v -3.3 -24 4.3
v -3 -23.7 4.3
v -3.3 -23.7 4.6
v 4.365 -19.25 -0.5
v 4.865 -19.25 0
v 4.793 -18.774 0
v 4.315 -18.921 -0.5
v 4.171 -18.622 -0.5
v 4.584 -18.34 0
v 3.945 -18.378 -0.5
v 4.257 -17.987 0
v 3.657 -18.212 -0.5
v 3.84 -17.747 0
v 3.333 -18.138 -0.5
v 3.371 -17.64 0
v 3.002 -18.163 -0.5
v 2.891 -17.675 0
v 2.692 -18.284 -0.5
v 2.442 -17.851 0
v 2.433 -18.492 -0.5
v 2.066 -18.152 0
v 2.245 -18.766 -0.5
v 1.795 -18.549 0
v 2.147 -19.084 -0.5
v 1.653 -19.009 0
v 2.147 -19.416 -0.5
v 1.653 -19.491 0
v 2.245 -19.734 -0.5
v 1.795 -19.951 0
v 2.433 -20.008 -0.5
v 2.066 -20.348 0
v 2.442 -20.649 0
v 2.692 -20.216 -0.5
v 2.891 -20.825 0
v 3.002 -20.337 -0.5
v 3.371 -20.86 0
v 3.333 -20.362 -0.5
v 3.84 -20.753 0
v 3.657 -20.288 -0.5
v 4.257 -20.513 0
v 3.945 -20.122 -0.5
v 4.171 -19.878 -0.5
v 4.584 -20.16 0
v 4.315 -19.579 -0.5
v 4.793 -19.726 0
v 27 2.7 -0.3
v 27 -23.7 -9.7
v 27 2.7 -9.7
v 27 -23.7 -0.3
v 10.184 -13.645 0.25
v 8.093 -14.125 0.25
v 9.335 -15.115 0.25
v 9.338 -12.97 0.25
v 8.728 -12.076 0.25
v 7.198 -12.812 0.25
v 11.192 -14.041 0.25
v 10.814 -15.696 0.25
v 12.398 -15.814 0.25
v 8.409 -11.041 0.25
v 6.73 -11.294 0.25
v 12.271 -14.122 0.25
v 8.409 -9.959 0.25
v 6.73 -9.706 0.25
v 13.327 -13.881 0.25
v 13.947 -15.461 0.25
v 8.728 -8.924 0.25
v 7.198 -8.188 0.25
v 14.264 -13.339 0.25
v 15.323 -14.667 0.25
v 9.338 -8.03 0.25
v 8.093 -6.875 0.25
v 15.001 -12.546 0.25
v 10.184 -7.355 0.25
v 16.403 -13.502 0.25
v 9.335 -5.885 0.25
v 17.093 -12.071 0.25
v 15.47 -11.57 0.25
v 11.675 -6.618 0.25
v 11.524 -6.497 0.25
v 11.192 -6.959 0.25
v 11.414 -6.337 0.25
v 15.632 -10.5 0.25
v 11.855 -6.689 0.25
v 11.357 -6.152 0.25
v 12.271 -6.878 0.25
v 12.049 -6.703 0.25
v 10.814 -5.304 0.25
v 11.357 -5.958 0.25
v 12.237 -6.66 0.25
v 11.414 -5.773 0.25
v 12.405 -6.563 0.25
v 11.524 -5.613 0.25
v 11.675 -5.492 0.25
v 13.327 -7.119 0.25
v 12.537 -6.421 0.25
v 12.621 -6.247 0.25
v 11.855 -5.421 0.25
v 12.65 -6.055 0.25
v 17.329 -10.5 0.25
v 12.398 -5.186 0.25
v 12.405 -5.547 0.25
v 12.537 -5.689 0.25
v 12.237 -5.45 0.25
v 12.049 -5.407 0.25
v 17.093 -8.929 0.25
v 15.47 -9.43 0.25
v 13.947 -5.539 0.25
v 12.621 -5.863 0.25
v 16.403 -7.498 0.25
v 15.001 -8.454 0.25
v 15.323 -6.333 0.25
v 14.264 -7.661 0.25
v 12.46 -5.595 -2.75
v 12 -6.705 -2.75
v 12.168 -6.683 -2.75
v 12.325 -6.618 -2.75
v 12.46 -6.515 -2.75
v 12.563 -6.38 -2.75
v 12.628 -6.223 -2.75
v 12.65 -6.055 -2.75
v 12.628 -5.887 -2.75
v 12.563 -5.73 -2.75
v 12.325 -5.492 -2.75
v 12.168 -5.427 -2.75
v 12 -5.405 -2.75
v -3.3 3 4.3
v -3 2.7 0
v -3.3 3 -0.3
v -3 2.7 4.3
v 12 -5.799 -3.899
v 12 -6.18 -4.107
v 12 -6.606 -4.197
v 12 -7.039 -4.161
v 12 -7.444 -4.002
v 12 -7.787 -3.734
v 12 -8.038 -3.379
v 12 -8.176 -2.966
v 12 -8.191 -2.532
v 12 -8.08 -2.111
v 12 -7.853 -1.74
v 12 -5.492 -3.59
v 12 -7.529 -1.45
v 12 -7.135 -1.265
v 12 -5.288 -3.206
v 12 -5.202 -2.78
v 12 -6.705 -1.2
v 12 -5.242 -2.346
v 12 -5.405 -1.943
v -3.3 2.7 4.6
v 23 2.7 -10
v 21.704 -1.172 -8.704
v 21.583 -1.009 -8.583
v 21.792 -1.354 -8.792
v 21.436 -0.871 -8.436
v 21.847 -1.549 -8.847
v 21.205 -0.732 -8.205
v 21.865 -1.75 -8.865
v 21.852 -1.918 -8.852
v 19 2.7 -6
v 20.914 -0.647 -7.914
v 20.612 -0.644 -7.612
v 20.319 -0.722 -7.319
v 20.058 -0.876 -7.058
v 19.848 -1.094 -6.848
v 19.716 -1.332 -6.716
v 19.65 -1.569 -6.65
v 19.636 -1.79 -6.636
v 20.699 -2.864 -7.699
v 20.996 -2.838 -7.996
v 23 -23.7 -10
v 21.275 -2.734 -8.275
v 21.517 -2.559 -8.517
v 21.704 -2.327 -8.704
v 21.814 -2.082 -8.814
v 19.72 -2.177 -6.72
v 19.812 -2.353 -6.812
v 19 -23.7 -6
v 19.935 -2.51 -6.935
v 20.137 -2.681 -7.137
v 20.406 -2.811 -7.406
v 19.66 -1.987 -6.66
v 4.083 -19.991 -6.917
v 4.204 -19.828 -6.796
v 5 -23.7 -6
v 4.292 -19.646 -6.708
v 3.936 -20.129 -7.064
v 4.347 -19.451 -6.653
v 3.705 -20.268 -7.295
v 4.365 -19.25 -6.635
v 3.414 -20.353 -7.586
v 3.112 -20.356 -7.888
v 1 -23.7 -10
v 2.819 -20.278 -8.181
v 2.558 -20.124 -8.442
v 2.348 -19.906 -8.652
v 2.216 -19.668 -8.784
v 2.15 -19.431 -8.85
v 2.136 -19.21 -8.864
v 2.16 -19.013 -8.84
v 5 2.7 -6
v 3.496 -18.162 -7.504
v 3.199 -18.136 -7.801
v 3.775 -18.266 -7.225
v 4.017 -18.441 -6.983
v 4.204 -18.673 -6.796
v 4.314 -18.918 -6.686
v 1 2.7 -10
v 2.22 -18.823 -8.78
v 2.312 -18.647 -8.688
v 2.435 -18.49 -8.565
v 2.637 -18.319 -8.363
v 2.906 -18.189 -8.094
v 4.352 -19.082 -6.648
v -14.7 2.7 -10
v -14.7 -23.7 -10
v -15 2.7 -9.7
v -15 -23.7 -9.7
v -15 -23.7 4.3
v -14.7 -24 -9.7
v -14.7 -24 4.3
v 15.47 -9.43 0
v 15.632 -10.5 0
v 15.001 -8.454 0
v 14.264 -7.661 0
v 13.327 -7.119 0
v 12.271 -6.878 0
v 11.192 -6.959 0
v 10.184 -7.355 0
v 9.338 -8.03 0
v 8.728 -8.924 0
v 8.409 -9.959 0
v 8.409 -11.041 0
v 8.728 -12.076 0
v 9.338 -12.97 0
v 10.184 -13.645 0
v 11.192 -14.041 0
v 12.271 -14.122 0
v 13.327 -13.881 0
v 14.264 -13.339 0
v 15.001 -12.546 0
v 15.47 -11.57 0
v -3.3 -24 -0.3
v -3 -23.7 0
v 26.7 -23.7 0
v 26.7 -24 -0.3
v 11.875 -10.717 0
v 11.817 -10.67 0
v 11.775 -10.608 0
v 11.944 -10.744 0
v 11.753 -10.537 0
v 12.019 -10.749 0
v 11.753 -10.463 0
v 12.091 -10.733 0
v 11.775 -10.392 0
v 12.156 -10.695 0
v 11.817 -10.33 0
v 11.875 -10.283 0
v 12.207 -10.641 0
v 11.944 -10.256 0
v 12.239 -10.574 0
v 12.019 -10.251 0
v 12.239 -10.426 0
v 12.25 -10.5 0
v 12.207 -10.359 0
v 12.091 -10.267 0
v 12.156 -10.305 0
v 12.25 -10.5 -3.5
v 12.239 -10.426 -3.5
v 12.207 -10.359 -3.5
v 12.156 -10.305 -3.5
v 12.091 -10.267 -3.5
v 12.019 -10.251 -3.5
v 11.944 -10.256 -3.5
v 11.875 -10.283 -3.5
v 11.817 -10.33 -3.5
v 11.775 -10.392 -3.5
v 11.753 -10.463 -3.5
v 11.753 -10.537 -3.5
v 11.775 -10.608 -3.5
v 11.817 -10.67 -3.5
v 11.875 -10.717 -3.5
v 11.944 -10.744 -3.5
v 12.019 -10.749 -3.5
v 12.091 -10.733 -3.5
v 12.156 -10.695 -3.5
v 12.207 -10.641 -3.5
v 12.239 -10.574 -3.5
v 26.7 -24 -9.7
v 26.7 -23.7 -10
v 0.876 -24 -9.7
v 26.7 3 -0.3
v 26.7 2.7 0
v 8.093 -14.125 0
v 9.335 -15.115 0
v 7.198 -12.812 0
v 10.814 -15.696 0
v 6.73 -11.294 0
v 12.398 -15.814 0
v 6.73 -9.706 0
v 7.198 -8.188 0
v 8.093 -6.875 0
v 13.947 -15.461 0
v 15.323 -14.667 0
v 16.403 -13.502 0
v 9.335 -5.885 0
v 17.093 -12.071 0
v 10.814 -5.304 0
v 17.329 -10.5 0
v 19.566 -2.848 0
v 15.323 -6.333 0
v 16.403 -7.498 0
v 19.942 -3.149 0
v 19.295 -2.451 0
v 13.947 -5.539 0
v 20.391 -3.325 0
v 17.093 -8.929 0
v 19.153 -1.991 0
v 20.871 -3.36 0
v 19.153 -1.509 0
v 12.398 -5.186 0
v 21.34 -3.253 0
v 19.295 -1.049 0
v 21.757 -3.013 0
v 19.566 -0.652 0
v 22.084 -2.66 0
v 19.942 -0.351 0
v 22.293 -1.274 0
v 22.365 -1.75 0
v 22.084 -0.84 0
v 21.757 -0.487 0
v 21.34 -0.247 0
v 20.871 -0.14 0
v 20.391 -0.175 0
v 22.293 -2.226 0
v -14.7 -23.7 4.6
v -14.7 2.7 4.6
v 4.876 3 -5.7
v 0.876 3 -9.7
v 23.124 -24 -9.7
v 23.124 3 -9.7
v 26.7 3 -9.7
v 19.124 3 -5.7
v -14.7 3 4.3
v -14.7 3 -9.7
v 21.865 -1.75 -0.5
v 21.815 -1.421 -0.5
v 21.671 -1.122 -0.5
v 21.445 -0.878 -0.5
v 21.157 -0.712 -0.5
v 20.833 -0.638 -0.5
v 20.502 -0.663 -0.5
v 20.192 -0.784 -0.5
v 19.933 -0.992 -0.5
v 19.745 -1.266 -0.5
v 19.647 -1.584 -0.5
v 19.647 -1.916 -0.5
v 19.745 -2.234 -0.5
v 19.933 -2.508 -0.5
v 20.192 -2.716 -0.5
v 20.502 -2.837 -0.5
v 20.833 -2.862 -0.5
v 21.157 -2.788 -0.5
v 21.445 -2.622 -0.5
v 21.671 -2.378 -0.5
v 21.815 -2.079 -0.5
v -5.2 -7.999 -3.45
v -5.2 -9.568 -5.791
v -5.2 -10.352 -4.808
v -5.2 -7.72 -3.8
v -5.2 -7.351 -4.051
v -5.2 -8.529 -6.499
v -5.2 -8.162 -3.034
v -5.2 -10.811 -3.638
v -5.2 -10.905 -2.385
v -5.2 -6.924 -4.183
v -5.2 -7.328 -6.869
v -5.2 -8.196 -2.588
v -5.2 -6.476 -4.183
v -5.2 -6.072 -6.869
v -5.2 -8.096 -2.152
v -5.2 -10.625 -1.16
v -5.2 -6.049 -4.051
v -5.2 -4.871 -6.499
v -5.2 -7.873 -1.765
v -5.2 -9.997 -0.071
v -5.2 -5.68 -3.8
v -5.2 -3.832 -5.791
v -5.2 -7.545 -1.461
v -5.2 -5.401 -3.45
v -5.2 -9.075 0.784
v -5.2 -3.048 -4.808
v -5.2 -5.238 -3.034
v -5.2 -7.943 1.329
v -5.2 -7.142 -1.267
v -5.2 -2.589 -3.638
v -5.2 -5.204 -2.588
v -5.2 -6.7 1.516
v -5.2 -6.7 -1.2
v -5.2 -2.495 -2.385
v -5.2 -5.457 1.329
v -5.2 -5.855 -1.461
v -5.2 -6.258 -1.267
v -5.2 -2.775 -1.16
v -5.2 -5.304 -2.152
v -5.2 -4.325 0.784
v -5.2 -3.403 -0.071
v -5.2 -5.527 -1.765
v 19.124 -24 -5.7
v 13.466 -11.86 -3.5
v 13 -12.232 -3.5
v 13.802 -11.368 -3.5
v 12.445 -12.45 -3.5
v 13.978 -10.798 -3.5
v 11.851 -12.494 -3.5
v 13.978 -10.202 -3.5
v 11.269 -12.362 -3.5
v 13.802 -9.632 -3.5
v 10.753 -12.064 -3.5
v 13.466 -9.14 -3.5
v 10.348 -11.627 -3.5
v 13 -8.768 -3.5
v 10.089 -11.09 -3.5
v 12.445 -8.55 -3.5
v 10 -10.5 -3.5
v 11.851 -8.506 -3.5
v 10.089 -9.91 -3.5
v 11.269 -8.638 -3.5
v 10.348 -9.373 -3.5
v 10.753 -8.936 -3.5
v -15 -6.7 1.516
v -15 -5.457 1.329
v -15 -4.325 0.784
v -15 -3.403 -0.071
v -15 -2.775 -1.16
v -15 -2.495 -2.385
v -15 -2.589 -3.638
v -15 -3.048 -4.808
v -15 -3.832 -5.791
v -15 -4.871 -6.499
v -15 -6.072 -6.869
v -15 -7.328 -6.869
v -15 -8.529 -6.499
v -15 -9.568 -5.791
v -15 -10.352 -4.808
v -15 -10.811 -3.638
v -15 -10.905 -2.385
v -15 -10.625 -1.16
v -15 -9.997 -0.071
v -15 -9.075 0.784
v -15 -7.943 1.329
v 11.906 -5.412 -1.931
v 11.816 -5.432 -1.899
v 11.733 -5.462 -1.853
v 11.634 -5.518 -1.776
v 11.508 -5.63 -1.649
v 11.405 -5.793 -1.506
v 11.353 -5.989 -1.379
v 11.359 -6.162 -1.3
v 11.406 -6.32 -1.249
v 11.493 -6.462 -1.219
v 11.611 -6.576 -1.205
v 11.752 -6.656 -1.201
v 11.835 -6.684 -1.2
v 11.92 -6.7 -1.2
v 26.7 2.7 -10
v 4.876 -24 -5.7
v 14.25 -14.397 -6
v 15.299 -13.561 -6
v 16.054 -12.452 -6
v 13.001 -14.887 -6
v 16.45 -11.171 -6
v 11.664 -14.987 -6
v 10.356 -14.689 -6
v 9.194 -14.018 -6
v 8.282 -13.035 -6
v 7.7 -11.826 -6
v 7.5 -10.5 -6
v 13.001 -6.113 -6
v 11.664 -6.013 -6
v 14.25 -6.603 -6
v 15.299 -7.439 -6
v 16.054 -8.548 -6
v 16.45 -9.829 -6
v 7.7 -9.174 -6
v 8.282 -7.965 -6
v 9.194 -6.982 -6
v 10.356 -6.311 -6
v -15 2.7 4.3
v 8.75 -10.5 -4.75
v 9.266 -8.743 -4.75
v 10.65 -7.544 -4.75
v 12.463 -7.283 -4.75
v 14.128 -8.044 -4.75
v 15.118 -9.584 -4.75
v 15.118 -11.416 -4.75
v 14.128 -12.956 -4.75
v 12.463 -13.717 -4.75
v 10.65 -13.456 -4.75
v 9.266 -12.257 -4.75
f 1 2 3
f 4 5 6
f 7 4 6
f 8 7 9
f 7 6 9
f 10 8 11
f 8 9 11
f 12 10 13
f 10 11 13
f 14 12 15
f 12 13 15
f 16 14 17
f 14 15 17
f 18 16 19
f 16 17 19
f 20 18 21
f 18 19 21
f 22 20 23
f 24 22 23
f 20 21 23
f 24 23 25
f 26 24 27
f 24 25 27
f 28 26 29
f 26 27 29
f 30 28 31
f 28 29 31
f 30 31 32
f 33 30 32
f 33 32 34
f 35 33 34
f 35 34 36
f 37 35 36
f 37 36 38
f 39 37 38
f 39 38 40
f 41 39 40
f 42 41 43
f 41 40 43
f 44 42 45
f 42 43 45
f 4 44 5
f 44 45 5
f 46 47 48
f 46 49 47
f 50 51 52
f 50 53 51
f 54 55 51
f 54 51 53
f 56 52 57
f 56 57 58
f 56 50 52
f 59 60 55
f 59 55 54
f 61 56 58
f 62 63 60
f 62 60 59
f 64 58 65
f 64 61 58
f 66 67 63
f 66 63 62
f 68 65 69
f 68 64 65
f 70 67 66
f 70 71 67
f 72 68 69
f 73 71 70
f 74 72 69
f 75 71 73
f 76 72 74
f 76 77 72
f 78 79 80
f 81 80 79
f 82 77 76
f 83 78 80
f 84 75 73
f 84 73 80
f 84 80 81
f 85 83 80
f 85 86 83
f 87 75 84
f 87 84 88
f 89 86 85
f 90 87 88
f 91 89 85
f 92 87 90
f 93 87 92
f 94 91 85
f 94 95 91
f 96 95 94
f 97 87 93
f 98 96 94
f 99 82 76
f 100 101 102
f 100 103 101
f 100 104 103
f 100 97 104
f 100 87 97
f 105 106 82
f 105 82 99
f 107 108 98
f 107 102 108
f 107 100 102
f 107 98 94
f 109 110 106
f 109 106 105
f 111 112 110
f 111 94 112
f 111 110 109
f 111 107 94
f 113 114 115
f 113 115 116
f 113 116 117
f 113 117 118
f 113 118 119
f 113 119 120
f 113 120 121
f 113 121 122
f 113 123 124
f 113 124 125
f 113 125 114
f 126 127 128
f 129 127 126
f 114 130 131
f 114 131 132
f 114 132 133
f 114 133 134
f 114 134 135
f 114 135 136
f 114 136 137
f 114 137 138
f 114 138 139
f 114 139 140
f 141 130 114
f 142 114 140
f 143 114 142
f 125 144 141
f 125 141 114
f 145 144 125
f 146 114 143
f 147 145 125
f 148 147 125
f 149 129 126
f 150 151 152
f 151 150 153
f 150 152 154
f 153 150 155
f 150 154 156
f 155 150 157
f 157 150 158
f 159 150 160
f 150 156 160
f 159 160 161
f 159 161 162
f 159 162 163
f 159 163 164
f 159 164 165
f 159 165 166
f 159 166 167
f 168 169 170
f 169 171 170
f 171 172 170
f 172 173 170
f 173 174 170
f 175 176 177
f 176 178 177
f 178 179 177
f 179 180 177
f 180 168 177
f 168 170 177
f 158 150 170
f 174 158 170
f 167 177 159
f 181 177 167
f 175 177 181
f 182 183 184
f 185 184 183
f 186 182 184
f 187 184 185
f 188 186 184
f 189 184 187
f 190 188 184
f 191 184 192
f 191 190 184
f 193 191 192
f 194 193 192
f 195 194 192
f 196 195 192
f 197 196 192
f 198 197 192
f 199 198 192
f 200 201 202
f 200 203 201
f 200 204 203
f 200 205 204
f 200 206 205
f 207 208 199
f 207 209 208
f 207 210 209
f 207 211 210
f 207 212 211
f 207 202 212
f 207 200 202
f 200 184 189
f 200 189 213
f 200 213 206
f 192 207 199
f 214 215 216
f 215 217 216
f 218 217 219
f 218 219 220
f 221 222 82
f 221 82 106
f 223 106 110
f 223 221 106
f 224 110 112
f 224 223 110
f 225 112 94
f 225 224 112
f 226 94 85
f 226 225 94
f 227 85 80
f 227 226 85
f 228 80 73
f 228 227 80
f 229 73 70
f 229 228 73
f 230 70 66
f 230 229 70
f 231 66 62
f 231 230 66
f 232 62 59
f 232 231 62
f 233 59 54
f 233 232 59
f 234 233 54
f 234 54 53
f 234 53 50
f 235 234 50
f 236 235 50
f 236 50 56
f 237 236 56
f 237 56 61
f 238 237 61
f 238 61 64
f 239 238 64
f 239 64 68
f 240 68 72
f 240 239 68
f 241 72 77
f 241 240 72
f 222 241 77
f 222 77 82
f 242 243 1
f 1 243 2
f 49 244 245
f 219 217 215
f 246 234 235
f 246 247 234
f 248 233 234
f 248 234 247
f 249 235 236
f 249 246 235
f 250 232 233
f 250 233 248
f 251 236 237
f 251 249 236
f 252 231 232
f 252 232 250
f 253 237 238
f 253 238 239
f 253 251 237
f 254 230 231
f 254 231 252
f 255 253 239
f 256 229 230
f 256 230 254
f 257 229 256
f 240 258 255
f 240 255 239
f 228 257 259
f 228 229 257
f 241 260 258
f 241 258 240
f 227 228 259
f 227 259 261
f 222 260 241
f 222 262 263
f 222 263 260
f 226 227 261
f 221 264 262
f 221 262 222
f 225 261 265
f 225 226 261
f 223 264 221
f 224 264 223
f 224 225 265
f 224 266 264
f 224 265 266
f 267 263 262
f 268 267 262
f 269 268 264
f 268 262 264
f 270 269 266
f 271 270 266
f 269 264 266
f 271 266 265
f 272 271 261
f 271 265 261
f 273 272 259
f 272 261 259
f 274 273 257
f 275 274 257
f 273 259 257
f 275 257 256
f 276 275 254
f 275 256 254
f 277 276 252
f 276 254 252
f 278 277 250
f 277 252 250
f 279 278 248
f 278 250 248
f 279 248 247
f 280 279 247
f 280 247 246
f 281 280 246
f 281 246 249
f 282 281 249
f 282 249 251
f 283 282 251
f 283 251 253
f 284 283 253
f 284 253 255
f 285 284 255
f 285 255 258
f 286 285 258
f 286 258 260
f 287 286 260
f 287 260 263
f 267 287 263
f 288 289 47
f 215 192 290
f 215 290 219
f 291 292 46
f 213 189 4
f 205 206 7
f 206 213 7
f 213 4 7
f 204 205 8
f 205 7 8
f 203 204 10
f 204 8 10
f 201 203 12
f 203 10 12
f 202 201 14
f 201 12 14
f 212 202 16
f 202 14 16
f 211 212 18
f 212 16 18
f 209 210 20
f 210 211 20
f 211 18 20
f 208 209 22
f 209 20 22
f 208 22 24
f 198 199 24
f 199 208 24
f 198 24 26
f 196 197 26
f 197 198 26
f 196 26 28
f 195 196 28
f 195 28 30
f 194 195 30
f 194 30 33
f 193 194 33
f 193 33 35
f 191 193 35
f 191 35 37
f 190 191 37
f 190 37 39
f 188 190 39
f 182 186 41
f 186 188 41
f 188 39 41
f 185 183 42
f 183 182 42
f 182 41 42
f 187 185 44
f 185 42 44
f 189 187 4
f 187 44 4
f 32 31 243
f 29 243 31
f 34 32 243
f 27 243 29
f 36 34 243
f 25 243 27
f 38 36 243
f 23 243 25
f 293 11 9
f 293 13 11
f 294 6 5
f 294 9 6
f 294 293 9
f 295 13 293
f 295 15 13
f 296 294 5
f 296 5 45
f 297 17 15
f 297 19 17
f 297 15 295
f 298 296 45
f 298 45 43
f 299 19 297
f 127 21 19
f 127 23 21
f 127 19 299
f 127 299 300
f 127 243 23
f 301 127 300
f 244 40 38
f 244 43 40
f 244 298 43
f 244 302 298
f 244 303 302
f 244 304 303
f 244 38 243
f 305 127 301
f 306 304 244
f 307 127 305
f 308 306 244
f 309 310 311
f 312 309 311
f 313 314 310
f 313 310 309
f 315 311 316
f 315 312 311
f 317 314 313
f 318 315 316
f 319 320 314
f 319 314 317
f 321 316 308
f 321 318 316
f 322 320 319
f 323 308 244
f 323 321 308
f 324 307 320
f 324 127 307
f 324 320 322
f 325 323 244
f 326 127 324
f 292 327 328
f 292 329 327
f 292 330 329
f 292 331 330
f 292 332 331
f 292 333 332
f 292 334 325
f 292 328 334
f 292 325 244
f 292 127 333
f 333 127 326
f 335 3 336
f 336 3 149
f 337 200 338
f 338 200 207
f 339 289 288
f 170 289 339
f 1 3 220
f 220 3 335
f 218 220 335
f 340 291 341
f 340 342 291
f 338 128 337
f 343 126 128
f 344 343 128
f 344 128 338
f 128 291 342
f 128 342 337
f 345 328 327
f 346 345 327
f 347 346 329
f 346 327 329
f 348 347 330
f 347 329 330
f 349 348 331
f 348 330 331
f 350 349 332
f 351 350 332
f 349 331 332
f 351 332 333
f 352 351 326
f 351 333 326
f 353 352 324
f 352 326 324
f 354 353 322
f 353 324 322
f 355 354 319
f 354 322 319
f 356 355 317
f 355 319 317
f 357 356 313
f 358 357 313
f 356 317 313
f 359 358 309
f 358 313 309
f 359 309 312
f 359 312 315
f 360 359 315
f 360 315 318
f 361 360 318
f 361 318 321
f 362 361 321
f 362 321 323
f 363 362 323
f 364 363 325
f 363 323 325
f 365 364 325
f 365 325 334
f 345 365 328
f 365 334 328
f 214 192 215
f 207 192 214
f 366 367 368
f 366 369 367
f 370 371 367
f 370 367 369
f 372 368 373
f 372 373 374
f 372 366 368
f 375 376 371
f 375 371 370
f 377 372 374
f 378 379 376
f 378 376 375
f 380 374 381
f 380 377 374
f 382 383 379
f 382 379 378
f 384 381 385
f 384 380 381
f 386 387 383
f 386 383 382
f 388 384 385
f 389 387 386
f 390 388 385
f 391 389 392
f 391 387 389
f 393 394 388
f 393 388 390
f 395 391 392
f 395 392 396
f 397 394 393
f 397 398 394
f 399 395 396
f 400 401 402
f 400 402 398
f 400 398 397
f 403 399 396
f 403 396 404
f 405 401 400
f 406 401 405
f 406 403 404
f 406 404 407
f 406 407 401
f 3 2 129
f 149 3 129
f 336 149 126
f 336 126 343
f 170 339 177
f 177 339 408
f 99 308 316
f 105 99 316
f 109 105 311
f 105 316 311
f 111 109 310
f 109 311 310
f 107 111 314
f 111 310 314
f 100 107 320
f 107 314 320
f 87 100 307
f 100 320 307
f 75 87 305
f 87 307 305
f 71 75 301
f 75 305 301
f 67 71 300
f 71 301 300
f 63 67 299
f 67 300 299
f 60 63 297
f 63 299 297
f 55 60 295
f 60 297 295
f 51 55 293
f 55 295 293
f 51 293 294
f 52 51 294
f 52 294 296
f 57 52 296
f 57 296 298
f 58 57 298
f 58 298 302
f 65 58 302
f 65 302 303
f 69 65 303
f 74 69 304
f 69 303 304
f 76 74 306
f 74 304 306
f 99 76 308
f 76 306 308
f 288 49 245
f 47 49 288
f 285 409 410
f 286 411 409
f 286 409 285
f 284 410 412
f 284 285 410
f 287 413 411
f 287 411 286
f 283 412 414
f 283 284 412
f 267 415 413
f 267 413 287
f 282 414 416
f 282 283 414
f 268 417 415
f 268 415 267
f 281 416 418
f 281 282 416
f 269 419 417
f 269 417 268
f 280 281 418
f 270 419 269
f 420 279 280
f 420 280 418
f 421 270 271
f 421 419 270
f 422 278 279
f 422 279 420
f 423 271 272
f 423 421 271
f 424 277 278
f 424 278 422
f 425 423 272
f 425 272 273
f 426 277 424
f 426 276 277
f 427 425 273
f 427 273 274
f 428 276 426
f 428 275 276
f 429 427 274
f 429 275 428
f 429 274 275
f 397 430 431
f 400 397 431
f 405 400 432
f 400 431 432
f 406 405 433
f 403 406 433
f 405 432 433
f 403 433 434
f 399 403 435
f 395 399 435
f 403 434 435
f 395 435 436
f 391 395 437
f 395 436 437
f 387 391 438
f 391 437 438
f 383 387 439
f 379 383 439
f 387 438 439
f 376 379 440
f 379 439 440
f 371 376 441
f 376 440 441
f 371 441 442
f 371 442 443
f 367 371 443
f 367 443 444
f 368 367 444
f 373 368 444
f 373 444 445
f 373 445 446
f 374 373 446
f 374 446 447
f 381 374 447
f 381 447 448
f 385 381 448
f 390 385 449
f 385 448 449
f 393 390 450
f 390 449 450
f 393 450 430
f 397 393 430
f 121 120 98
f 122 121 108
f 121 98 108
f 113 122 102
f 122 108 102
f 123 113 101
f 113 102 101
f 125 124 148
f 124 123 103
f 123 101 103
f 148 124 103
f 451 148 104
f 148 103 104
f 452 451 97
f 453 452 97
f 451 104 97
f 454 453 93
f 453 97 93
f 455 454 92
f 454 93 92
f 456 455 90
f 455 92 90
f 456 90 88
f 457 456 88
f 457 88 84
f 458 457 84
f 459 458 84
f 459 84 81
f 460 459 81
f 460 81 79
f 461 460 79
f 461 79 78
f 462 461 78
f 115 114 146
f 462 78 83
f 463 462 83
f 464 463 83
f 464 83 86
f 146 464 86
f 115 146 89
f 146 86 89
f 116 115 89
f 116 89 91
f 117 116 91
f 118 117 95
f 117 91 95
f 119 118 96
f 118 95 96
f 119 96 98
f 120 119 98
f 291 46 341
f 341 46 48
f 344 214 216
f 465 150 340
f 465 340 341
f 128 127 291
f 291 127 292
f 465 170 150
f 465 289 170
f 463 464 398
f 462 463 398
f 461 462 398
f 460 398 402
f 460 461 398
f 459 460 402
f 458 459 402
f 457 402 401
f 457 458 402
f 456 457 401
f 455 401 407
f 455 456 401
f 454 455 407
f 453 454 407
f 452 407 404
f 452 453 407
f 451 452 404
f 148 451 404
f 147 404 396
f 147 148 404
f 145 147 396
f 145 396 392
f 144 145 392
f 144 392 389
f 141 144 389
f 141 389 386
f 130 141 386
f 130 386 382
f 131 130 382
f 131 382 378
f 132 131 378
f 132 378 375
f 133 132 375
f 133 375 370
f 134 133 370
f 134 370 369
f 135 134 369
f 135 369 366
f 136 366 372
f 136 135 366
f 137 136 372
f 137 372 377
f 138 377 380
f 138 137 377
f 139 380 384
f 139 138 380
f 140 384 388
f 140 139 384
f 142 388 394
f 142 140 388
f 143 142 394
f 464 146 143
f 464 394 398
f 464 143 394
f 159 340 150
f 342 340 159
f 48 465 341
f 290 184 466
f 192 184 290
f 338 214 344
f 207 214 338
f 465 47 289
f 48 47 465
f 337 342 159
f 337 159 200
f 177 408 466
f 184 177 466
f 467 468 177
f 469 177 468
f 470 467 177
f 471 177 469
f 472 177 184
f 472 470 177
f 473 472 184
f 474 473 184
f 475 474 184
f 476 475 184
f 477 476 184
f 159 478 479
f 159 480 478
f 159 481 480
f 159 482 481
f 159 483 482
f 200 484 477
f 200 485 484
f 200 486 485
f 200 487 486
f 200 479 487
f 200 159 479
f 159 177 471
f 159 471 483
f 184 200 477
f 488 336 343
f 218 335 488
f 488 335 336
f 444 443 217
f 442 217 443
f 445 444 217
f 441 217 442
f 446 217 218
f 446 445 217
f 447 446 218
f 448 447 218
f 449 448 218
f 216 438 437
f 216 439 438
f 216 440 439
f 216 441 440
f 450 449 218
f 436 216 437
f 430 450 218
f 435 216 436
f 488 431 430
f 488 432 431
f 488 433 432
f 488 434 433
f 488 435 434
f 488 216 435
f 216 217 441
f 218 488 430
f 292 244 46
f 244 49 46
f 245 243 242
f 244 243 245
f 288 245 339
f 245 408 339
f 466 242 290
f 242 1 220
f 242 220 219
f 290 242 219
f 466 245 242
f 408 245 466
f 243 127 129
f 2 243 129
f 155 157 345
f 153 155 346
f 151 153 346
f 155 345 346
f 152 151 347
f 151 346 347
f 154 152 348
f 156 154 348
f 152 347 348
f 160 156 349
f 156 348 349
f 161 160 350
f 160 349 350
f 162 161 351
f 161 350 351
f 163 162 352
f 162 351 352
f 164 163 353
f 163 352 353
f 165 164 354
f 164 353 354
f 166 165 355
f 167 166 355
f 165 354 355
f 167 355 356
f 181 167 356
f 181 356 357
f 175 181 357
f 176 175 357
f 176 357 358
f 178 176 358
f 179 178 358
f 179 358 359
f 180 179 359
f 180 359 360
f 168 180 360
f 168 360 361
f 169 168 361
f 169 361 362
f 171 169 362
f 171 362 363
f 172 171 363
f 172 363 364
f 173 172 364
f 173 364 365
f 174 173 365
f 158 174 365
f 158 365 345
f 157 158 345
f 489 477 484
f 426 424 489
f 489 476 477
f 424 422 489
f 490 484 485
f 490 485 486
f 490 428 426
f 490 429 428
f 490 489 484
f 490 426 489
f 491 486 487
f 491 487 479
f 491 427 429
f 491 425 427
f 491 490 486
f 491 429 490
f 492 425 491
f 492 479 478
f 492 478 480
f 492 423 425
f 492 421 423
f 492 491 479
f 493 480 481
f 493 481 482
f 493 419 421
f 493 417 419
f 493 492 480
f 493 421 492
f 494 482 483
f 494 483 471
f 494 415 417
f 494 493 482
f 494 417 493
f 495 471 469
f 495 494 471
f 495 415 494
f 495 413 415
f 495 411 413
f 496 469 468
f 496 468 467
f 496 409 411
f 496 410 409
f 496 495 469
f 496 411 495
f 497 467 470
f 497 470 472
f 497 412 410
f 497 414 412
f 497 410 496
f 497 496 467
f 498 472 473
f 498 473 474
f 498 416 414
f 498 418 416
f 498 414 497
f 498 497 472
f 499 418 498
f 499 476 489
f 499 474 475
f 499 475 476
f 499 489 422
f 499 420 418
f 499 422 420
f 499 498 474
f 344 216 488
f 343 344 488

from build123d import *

# Parameters (mm, degrees)
SKETCH1_W               = 30
SKETCH1_H               = 27
BOSS_EXTRUDE1_DEPTH     = 10
SKETCH2_R               = 1.115
CUT_EXTRUDE1_DEPTH      = 10
SKETCH2_4_R             = 5.329276436
SKETCH2_4_R_2           = 3.631824093
BOSS_EXTRUDE2_DEPTH     = 0.25
SKETCH2_5_R             = 0.25
CUT_EXTRUDE2_DEPTH      = 10
SKETCH4_R               = 0.65
CUT_EXTRUDE3_DEPTH      = 3
SKETCH5_W               = 14.6
SKETCH5_H               = 27
BOSS_EXTRUDE3_DEPTH     = 12
CUT_EXTRUDE4_DEPTH      = 12
CUT_EXTRUDE4_DEPTH_BACK = 15
SKETCH3_R               = 1.5
SKETCH7_R               = 4.2164
CUT_EXTRUDE5_DEPTH      = 9.8
SKETCH8_W               = 22
SKETCH8_H               = 27
CUT_EXTRUDE6_DEPTH      = 4
CHAMFER1_SIZE           = 4
SKETCH9_R               = 2
CUT_EXTRUDE7_DEPTH      = 2.5
CHAMFER2_SIZE           = 2.5
CHAMFER3_SIZE           = 0.3
CHAMFER4_SIZE           = 0.5


# Some blends are built 0.0001 mm under size
with BuildPart() as part:
    # Sketch1 → Boss-Extrude1 (new body)
    with BuildSketch(Plane.XY):
        with Locations((12, -10.5)):
            Rectangle(SKETCH1_W, SKETCH1_H)
    extrude(amount=-BOSS_EXTRUDE1_DEPTH)

    # Sketch2 → Cut-Extrude1 (cut)
    with BuildSketch(Plane.XY):
        with Locations((20.75, -1.75)):
            Circle(SKETCH2_R)
        with Locations((3.25, -19.25)):
            Circle(SKETCH2_R)
    extrude(amount=-CUT_EXTRUDE1_DEPTH, mode=Mode.SUBTRACT)

    # Sketch2<4> → Boss-Extrude2 (add)
    with BuildSketch(Plane.XY):
        with Locations((12, -10.5)):
            Circle(SKETCH2_4_R)
        with Locations((12, -10.5)):
            Circle(SKETCH2_4_R_2, mode=Mode.SUBTRACT)
    extrude(amount=BOSS_EXTRUDE2_DEPTH)

    # Sketch2<5> → Cut-Extrude2 (cut)
    with BuildSketch(Plane.XY):
        with Locations((12, -10.5)):
            Circle(SKETCH2_5_R)
    extrude(amount=-CUT_EXTRUDE2_DEPTH, mode=Mode.SUBTRACT)

    # Sketch4 → Cut-Extrude3 (cut)
    with BuildSketch(Plane.XY.offset(0.25)):
        with Locations((12, -6.055)):
            Circle(SKETCH4_R)
    extrude(amount=-CUT_EXTRUDE3_DEPTH, mode=Mode.SUBTRACT)

    # Sketch5 → Boss-Extrude3 (add)
    with BuildSketch(Plane.ZY.offset(3)):
        with Locations((-2.7, -10.5)):
            Rectangle(SKETCH5_W, SKETCH5_H)
    extrude(amount=BOSS_EXTRUDE3_DEPTH)

    # Sketch3 → Cut-Extrude4 (cut, two sides: drawn at the far end of the back side and taken through both)
    with BuildSketch(Plane.ZY.offset(3).offset(-CUT_EXTRUDE4_DEPTH_BACK)):
        with Locations((-2.7, -6.7)):
            Circle(SKETCH3_R)
    extrude(amount=CUT_EXTRUDE4_DEPTH + CUT_EXTRUDE4_DEPTH_BACK, mode=Mode.SUBTRACT)

    # Sketch7 → Cut-Extrude5 (cut)
    with BuildSketch(Plane.ZY.offset(15)):
        with Locations((-2.7, -6.7)):
            Circle(SKETCH7_R)
    extrude(amount=-CUT_EXTRUDE5_DEPTH, mode=Mode.SUBTRACT)

    # Sketch8 → Cut-Extrude6 (cut)
    with BuildSketch(Plane(origin=(0, 0, -10), x_dir=(-1, 0, 0), z_dir=(0, 0, -1))):
        with Locations((-12, -10.5)):
            Rectangle(SKETCH8_W, SKETCH8_H)
    extrude(amount=-CUT_EXTRUDE6_DEPTH, mode=Mode.SUBTRACT)

    # Chamfer1
    # the kernel refuses this chamfer: 4 mm, written as the material it adds along each edge
    with BuildSketch(Plane(origin=(1, 3, -6), x_dir=(0.9996219169112968, 0, 0.027495876610586275), z_dir=(0, -1, 0))) as chamfer1_piece_1_section:
        Polygon((CHAMFER1_SIZE * 0.999621916911, -CHAMFER1_SIZE * 0.0274958766106), (-CHAMFER1_SIZE * 0.0274958766106, -CHAMFER1_SIZE * 0.999621916911), (0, 0), align=None)
    chamfer1_piece_1 = extrude(amount=27, mode=Mode.PRIVATE)
    chamfer1_piece_1 = chamfer1_piece_1 - Plane(origin=(3.25, -19.25, -7.327035159), x_dir=(1, 0, 0), z_dir=(0, 0, 1)) * Cylinder(1.115, 70, mode=Mode.PRIVATE)
    chamfer1_piece_1 = split(chamfer1_piece_1, bisect_by=Plane(origin=(2.297726003, -10.22672805, -10), z_dir=(0, 0, 1)), keep=Keep.TOP, mode=Mode.PRIVATE)
    add(chamfer1_piece_1)
    with BuildSketch(Plane(origin=(23, -24, -6), x_dir=(0.027495876610586494, 0, -0.9996219169112968), z_dir=(0, 1, 0))) as chamfer1_piece_2_section:
        Polygon((CHAMFER1_SIZE * 0.999621916911, CHAMFER1_SIZE * 0.0274958766106), (-CHAMFER1_SIZE * 0.0274958766106, CHAMFER1_SIZE * 0.999621916911), (0, 0), align=None)
    chamfer1_piece_2 = extrude(amount=27, mode=Mode.PRIVATE)
    chamfer1_piece_2 = split(chamfer1_piece_2, bisect_by=Plane(origin=(21.702275046, -10.773273502, -10), z_dir=(0, 0, 1)), keep=Keep.TOP, mode=Mode.PRIVATE)
    chamfer1_piece_2 = chamfer1_piece_2 - Plane(origin=(20.75, -1.75, -7.327035315), x_dir=(1, 0, 0), z_dir=(0, 0, 1)) * Cylinder(1.115, 70, mode=Mode.PRIVATE)
    add(chamfer1_piece_2)

    # Sketch9 → Cut-Extrude7 (cut)
    with BuildSketch(Plane(origin=(0, 0, -6), x_dir=(-1, 0, 0), z_dir=(0, 0, -1))):
        with Locations((-12, -10.5)):
            Circle(SKETCH9_R)
    extrude(amount=-CUT_EXTRUDE7_DEPTH, mode=Mode.SUBTRACT)

    # Chamfer2
    chamfer2_edges = [part.edges().sort_by_distance(p)[0] for p in [
        (14, -10.5, -6),
    ]]
    chamfer(chamfer2_edges, length=CHAMFER2_SIZE - 0.0001)  # a hair under: the kernel refuses the full size

    # Chamfer3
    chamfer3_edges = [part.edges().sort_by_distance(p)[0] for p in [
        (3, -24, -8),
        (27, -10.5, -10),
        (-7, 3, -10),
        (-3, -24, 2.3),
        (-3, -10.5, 4.6),
        (-9, -24, 4.6),
        (-3, 3, 2.3),
        (-9, 3, 4.6),
        (-15, -10.5, -10),
        (-15, -24, -2.7),
        (-15, -10.5, 4.6),
        (-15, 3, -2.7),
        (12, 3, 0),
        (27, -10.5, 0),
        (12, -24, 0),
        (25, -24, -10),
        (25, 3, -10),
        (27, 3, -5),
        (27, -24, -5),
        (-7, -24, -10),
        (12, -24, -6),
        (12, 3, -6),
        (21, -24, -8),
        (21, 3, -8),
        (3, 3, -8),
    ]]
    chamfer(chamfer3_edges, length=CHAMFER3_SIZE)

    # Chamfer4
    chamfer4_edges = [part.edges().sort_by_distance(p)[0] for p in [
        (2.135, -19.25, 0),
        (19.635, -1.75, 0),
    ]]
    chamfer(chamfer4_edges, length=CHAMFER4_SIZE)


solid = part.part
